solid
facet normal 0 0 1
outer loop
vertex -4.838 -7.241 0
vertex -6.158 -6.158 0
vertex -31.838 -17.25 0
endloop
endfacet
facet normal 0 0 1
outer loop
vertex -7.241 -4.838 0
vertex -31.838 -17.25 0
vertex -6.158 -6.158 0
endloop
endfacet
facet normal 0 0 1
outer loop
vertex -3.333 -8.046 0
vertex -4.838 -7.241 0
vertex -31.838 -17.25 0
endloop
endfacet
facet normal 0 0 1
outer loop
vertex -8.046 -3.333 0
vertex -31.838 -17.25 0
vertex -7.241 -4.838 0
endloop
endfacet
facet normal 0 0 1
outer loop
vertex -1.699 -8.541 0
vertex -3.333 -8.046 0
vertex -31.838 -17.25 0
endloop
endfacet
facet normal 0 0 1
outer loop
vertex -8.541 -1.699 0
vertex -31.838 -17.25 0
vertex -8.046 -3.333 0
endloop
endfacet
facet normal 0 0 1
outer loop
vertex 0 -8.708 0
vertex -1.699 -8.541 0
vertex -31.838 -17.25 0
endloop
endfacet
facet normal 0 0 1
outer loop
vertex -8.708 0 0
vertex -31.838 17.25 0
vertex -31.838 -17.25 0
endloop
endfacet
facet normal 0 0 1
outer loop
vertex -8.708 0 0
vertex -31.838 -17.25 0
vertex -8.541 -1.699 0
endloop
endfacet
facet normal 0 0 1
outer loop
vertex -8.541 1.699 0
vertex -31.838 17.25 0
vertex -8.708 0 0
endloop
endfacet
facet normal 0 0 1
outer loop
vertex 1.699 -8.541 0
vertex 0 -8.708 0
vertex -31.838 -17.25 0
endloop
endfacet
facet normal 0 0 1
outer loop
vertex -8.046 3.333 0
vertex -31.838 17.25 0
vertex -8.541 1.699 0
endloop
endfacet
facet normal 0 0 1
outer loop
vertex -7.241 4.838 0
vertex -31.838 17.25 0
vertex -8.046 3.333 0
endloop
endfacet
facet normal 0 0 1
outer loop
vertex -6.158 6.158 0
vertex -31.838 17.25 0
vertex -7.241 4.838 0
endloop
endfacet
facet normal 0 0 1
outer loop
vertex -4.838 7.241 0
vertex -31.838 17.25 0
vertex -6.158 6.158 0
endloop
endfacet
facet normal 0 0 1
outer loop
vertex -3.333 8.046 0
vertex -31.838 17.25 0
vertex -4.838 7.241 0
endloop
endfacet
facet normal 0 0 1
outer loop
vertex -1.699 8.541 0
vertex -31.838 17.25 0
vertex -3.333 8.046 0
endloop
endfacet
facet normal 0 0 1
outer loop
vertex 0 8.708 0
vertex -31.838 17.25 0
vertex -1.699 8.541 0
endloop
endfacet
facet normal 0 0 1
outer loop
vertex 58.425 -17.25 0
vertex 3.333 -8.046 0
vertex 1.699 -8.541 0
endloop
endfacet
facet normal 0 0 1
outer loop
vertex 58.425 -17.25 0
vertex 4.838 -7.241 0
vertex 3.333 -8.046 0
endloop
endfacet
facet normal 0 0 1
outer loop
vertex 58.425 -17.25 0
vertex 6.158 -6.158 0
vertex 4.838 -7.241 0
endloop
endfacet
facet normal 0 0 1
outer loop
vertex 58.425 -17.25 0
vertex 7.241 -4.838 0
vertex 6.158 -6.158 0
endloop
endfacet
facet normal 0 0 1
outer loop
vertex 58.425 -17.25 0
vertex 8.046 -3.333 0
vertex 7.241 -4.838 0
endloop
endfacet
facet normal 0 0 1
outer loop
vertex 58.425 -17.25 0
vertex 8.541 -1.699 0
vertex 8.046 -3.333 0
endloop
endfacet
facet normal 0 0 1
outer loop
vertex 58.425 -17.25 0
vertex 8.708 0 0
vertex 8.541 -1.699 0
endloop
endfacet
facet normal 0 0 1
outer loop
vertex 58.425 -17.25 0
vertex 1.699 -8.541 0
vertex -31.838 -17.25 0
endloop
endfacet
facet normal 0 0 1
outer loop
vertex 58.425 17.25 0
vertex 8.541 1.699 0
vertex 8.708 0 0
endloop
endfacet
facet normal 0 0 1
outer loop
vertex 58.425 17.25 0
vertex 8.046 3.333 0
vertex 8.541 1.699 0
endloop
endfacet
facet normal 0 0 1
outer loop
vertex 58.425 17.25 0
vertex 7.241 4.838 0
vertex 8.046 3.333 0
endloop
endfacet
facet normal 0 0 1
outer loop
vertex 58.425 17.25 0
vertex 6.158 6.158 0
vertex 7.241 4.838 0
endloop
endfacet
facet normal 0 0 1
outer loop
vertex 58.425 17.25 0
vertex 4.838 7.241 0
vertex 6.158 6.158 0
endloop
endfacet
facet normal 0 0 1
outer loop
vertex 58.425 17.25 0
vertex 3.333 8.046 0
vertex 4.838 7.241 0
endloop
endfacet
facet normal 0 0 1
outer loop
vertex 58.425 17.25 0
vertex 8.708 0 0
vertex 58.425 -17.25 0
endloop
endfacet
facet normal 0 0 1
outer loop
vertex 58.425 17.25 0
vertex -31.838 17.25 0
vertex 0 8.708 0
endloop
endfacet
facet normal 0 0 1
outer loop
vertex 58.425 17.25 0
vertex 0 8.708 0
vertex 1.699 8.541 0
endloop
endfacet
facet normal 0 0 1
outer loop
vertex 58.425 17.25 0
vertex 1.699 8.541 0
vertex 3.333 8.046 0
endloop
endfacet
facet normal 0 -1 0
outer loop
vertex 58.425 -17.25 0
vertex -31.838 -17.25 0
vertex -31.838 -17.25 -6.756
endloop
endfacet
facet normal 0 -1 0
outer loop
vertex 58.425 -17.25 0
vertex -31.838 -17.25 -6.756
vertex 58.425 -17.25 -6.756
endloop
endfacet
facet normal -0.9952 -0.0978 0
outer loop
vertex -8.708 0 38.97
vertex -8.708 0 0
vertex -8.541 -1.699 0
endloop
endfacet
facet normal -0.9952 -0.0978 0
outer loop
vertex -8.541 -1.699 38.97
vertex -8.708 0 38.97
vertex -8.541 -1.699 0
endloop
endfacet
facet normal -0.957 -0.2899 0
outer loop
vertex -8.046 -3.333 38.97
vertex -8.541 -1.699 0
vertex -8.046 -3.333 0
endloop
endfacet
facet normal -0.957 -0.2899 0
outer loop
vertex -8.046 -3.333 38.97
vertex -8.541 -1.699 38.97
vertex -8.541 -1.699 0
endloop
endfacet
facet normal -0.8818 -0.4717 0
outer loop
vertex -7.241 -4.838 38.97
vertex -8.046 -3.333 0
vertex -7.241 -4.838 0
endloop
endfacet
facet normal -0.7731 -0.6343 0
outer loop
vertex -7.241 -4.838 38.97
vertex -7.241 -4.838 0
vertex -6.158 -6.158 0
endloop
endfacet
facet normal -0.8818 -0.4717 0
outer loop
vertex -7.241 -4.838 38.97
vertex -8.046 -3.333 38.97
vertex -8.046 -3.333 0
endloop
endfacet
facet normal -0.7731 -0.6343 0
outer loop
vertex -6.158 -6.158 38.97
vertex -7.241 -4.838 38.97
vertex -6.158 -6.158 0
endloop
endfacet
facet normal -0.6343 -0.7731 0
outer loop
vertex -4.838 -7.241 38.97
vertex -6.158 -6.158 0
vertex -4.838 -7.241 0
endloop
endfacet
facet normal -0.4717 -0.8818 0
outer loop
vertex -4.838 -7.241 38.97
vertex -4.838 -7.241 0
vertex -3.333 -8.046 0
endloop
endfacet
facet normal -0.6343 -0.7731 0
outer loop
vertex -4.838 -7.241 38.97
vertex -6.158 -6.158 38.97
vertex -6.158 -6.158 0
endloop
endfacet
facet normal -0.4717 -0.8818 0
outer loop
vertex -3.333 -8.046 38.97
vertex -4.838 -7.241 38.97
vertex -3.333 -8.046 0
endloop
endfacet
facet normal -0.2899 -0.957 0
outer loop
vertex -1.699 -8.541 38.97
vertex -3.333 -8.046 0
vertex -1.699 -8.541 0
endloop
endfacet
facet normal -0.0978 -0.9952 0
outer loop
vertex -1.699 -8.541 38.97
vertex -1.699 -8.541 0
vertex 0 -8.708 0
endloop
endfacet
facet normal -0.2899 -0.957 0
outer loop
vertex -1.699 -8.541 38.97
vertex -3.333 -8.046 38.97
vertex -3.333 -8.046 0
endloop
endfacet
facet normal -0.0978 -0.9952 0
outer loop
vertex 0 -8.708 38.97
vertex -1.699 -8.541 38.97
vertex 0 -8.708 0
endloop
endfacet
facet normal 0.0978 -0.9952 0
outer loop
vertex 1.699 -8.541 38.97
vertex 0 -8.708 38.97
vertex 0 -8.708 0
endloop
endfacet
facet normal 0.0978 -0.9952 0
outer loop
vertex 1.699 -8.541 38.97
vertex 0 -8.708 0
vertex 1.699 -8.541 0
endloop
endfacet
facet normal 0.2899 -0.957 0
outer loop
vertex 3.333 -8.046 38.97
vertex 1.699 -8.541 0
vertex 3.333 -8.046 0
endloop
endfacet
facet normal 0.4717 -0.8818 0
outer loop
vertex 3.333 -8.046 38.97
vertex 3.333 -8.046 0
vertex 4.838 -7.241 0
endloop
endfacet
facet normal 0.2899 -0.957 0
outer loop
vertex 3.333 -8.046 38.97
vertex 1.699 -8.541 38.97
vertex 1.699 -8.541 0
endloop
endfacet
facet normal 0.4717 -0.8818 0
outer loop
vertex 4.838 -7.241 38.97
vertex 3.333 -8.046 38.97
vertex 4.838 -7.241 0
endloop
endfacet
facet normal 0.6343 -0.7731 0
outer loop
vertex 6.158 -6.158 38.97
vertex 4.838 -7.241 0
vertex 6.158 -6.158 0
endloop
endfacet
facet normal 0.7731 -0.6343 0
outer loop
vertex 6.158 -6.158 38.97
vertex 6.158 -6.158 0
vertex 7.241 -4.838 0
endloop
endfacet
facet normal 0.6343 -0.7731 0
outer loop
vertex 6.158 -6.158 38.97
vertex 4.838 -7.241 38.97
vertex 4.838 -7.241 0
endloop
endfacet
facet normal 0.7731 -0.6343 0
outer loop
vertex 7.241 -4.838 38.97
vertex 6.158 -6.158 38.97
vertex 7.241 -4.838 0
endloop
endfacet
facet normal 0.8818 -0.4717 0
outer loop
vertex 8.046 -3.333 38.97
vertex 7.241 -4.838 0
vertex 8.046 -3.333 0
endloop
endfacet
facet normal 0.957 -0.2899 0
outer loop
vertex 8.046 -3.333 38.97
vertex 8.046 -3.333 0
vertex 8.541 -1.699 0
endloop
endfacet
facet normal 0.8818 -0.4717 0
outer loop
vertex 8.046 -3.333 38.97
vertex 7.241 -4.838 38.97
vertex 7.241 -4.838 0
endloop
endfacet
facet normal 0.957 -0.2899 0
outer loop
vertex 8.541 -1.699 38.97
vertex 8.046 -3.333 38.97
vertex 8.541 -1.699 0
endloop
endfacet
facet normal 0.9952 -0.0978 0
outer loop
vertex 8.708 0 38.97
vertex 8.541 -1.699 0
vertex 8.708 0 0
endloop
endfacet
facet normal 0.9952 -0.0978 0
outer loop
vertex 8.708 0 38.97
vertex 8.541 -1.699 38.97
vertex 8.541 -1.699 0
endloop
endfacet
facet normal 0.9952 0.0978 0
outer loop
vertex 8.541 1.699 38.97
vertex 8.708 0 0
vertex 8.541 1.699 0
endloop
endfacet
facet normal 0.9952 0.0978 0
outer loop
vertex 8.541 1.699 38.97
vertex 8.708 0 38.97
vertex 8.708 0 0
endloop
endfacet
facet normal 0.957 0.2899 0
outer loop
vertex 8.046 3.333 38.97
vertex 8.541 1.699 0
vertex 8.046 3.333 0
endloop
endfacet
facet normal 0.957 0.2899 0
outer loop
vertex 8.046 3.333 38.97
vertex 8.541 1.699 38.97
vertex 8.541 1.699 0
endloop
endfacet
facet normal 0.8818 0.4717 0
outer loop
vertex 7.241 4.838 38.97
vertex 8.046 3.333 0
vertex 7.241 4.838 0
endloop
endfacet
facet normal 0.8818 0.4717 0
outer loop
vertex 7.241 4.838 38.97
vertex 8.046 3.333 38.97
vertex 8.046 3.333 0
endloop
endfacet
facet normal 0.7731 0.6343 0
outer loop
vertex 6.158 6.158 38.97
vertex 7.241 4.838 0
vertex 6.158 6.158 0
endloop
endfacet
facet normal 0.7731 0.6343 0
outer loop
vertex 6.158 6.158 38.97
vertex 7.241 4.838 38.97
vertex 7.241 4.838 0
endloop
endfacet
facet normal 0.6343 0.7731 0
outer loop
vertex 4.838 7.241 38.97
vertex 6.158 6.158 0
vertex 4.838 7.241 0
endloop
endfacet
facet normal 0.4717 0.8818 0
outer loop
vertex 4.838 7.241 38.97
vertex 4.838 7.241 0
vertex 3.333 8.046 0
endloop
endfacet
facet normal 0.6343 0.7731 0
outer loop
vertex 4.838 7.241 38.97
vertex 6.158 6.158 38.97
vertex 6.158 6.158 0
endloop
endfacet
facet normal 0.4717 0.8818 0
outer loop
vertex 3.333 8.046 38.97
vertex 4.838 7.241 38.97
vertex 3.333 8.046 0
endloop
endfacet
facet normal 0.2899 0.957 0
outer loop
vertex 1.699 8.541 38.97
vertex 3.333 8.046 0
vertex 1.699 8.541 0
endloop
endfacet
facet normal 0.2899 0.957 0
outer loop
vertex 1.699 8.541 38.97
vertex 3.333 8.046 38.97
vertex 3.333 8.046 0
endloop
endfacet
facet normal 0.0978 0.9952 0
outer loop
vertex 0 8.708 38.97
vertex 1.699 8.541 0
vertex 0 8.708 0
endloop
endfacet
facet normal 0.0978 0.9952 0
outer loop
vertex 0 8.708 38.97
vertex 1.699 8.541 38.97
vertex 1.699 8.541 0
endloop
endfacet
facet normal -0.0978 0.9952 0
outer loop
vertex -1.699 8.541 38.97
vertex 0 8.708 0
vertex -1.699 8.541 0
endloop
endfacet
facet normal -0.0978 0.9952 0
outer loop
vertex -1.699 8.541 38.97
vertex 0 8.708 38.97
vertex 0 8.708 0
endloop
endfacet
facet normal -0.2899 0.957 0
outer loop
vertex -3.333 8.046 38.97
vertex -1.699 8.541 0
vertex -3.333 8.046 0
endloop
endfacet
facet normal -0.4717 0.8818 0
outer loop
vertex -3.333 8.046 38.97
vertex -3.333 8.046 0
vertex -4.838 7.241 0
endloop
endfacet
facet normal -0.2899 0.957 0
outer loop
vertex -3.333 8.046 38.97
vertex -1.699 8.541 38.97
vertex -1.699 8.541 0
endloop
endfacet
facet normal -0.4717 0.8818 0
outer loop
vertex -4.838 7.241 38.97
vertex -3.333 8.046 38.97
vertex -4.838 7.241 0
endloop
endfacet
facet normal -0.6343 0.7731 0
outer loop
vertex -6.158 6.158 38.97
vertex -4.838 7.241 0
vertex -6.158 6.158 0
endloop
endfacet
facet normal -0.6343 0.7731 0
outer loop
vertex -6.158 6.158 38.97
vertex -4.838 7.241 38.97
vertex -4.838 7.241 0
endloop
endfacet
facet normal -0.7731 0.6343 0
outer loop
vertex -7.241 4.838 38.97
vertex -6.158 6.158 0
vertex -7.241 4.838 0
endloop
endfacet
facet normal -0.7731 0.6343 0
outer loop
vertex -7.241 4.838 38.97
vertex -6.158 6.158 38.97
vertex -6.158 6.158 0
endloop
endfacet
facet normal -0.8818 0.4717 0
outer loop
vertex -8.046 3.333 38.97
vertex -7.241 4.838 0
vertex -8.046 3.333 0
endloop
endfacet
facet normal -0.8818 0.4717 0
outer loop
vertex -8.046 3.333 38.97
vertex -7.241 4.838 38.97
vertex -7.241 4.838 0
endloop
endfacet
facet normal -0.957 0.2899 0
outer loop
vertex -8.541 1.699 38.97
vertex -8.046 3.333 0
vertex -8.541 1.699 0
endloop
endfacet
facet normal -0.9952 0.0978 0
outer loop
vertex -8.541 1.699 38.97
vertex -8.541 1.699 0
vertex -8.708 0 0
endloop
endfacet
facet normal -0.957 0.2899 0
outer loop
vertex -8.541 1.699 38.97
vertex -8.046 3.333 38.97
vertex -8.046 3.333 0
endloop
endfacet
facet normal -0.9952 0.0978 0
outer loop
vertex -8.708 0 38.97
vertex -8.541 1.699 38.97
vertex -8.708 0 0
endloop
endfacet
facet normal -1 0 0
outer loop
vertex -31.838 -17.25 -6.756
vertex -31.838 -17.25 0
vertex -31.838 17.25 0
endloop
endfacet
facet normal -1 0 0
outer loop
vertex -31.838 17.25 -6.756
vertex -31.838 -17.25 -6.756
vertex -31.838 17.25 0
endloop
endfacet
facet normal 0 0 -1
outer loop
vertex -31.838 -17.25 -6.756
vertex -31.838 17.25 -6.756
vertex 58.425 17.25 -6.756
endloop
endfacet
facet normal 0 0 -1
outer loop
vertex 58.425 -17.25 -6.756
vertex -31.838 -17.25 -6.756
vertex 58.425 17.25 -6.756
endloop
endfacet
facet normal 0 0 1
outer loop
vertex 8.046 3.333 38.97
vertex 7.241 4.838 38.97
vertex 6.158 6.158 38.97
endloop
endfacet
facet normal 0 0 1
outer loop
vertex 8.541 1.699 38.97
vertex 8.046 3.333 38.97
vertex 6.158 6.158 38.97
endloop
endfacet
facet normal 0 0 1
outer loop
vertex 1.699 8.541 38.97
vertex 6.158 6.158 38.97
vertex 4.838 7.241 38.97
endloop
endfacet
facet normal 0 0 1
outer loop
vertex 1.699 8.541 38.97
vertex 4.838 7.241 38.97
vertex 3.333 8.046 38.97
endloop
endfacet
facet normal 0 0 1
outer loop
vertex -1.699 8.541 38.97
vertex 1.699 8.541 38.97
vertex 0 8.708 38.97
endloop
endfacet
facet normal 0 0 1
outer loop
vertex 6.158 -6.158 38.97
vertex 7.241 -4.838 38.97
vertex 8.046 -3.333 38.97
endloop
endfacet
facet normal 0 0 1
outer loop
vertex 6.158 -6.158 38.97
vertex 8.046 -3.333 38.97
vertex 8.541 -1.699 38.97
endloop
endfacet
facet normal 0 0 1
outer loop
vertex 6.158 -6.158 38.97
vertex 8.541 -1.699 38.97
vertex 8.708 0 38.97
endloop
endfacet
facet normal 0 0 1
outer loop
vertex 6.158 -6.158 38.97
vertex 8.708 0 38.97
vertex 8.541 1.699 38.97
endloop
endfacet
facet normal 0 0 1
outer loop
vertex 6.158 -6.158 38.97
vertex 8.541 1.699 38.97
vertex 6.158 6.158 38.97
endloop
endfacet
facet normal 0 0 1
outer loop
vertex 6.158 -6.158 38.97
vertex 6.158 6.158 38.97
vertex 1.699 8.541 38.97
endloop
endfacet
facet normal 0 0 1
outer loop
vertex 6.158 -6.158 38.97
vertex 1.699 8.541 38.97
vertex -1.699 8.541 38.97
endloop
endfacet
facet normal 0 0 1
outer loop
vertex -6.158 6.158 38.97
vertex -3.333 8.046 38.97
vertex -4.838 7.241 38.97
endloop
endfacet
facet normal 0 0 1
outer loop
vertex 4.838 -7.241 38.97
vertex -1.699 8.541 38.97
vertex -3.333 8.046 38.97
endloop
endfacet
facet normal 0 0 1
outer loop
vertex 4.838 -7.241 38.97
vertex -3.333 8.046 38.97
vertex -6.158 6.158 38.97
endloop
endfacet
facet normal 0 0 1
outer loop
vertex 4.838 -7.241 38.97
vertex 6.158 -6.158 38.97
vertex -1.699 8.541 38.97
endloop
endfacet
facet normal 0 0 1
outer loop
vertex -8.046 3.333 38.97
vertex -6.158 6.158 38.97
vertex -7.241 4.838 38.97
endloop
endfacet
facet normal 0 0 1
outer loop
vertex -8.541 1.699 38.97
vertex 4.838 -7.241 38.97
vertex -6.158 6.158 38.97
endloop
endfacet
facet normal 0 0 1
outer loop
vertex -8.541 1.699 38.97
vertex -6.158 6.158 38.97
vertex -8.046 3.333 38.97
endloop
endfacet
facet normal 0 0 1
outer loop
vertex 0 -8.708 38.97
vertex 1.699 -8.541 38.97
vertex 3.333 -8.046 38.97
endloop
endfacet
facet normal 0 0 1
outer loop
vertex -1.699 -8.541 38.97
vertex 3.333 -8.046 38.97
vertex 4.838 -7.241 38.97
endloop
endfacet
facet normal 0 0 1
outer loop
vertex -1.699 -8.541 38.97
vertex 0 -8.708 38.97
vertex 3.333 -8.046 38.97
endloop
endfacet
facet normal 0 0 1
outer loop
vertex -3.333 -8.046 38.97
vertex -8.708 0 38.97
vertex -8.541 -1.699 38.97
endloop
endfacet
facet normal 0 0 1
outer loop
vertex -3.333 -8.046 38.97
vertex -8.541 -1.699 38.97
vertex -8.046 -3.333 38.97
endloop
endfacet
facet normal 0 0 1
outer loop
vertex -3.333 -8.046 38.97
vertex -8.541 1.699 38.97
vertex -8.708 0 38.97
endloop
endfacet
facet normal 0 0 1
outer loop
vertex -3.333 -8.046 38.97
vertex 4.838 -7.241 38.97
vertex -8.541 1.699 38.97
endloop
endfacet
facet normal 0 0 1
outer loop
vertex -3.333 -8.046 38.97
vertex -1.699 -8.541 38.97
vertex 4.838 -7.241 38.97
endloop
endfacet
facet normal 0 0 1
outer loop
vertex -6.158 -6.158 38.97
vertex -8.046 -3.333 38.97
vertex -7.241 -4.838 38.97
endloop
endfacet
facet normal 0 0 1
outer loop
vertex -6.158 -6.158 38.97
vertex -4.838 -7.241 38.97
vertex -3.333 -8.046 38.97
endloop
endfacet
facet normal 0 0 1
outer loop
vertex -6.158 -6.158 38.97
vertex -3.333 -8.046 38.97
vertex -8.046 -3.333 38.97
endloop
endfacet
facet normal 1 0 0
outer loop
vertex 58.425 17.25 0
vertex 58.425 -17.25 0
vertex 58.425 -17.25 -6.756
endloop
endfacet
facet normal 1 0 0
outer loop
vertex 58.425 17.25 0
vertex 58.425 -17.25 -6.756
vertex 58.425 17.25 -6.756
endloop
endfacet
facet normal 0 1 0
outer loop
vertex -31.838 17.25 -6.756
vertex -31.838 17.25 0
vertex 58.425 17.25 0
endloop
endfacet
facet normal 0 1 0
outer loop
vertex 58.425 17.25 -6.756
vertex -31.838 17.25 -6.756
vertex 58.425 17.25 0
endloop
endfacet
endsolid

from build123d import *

# Parameters (mm, degrees)
F0_W     = 8.7084230036
F0_H     = 38.9699079096
F2_W     = 90.2628563344
F2_H     = 34.500811249
F3_DEPTH = 6.75614


with BuildPart() as f1:
    # F0 (on Front) → F1 (revolve)
    with BuildSketch(Plane.XZ):
        with Locations((-4.3542115018, 19.4849539548)):
            Rectangle(F0_W, F0_H)
    revolve(axis=Axis((0, 0, 19.4849539548), (0, 0, 1)))

    # F2 (on Top) → F3 (join)
    with BuildSketch(Plane.XY):
        with Locations((13.2931489497, 0)):
            Rectangle(F2_W, F2_H)
    extrude(amount=-F3_DEPTH)


solid = f1.part
